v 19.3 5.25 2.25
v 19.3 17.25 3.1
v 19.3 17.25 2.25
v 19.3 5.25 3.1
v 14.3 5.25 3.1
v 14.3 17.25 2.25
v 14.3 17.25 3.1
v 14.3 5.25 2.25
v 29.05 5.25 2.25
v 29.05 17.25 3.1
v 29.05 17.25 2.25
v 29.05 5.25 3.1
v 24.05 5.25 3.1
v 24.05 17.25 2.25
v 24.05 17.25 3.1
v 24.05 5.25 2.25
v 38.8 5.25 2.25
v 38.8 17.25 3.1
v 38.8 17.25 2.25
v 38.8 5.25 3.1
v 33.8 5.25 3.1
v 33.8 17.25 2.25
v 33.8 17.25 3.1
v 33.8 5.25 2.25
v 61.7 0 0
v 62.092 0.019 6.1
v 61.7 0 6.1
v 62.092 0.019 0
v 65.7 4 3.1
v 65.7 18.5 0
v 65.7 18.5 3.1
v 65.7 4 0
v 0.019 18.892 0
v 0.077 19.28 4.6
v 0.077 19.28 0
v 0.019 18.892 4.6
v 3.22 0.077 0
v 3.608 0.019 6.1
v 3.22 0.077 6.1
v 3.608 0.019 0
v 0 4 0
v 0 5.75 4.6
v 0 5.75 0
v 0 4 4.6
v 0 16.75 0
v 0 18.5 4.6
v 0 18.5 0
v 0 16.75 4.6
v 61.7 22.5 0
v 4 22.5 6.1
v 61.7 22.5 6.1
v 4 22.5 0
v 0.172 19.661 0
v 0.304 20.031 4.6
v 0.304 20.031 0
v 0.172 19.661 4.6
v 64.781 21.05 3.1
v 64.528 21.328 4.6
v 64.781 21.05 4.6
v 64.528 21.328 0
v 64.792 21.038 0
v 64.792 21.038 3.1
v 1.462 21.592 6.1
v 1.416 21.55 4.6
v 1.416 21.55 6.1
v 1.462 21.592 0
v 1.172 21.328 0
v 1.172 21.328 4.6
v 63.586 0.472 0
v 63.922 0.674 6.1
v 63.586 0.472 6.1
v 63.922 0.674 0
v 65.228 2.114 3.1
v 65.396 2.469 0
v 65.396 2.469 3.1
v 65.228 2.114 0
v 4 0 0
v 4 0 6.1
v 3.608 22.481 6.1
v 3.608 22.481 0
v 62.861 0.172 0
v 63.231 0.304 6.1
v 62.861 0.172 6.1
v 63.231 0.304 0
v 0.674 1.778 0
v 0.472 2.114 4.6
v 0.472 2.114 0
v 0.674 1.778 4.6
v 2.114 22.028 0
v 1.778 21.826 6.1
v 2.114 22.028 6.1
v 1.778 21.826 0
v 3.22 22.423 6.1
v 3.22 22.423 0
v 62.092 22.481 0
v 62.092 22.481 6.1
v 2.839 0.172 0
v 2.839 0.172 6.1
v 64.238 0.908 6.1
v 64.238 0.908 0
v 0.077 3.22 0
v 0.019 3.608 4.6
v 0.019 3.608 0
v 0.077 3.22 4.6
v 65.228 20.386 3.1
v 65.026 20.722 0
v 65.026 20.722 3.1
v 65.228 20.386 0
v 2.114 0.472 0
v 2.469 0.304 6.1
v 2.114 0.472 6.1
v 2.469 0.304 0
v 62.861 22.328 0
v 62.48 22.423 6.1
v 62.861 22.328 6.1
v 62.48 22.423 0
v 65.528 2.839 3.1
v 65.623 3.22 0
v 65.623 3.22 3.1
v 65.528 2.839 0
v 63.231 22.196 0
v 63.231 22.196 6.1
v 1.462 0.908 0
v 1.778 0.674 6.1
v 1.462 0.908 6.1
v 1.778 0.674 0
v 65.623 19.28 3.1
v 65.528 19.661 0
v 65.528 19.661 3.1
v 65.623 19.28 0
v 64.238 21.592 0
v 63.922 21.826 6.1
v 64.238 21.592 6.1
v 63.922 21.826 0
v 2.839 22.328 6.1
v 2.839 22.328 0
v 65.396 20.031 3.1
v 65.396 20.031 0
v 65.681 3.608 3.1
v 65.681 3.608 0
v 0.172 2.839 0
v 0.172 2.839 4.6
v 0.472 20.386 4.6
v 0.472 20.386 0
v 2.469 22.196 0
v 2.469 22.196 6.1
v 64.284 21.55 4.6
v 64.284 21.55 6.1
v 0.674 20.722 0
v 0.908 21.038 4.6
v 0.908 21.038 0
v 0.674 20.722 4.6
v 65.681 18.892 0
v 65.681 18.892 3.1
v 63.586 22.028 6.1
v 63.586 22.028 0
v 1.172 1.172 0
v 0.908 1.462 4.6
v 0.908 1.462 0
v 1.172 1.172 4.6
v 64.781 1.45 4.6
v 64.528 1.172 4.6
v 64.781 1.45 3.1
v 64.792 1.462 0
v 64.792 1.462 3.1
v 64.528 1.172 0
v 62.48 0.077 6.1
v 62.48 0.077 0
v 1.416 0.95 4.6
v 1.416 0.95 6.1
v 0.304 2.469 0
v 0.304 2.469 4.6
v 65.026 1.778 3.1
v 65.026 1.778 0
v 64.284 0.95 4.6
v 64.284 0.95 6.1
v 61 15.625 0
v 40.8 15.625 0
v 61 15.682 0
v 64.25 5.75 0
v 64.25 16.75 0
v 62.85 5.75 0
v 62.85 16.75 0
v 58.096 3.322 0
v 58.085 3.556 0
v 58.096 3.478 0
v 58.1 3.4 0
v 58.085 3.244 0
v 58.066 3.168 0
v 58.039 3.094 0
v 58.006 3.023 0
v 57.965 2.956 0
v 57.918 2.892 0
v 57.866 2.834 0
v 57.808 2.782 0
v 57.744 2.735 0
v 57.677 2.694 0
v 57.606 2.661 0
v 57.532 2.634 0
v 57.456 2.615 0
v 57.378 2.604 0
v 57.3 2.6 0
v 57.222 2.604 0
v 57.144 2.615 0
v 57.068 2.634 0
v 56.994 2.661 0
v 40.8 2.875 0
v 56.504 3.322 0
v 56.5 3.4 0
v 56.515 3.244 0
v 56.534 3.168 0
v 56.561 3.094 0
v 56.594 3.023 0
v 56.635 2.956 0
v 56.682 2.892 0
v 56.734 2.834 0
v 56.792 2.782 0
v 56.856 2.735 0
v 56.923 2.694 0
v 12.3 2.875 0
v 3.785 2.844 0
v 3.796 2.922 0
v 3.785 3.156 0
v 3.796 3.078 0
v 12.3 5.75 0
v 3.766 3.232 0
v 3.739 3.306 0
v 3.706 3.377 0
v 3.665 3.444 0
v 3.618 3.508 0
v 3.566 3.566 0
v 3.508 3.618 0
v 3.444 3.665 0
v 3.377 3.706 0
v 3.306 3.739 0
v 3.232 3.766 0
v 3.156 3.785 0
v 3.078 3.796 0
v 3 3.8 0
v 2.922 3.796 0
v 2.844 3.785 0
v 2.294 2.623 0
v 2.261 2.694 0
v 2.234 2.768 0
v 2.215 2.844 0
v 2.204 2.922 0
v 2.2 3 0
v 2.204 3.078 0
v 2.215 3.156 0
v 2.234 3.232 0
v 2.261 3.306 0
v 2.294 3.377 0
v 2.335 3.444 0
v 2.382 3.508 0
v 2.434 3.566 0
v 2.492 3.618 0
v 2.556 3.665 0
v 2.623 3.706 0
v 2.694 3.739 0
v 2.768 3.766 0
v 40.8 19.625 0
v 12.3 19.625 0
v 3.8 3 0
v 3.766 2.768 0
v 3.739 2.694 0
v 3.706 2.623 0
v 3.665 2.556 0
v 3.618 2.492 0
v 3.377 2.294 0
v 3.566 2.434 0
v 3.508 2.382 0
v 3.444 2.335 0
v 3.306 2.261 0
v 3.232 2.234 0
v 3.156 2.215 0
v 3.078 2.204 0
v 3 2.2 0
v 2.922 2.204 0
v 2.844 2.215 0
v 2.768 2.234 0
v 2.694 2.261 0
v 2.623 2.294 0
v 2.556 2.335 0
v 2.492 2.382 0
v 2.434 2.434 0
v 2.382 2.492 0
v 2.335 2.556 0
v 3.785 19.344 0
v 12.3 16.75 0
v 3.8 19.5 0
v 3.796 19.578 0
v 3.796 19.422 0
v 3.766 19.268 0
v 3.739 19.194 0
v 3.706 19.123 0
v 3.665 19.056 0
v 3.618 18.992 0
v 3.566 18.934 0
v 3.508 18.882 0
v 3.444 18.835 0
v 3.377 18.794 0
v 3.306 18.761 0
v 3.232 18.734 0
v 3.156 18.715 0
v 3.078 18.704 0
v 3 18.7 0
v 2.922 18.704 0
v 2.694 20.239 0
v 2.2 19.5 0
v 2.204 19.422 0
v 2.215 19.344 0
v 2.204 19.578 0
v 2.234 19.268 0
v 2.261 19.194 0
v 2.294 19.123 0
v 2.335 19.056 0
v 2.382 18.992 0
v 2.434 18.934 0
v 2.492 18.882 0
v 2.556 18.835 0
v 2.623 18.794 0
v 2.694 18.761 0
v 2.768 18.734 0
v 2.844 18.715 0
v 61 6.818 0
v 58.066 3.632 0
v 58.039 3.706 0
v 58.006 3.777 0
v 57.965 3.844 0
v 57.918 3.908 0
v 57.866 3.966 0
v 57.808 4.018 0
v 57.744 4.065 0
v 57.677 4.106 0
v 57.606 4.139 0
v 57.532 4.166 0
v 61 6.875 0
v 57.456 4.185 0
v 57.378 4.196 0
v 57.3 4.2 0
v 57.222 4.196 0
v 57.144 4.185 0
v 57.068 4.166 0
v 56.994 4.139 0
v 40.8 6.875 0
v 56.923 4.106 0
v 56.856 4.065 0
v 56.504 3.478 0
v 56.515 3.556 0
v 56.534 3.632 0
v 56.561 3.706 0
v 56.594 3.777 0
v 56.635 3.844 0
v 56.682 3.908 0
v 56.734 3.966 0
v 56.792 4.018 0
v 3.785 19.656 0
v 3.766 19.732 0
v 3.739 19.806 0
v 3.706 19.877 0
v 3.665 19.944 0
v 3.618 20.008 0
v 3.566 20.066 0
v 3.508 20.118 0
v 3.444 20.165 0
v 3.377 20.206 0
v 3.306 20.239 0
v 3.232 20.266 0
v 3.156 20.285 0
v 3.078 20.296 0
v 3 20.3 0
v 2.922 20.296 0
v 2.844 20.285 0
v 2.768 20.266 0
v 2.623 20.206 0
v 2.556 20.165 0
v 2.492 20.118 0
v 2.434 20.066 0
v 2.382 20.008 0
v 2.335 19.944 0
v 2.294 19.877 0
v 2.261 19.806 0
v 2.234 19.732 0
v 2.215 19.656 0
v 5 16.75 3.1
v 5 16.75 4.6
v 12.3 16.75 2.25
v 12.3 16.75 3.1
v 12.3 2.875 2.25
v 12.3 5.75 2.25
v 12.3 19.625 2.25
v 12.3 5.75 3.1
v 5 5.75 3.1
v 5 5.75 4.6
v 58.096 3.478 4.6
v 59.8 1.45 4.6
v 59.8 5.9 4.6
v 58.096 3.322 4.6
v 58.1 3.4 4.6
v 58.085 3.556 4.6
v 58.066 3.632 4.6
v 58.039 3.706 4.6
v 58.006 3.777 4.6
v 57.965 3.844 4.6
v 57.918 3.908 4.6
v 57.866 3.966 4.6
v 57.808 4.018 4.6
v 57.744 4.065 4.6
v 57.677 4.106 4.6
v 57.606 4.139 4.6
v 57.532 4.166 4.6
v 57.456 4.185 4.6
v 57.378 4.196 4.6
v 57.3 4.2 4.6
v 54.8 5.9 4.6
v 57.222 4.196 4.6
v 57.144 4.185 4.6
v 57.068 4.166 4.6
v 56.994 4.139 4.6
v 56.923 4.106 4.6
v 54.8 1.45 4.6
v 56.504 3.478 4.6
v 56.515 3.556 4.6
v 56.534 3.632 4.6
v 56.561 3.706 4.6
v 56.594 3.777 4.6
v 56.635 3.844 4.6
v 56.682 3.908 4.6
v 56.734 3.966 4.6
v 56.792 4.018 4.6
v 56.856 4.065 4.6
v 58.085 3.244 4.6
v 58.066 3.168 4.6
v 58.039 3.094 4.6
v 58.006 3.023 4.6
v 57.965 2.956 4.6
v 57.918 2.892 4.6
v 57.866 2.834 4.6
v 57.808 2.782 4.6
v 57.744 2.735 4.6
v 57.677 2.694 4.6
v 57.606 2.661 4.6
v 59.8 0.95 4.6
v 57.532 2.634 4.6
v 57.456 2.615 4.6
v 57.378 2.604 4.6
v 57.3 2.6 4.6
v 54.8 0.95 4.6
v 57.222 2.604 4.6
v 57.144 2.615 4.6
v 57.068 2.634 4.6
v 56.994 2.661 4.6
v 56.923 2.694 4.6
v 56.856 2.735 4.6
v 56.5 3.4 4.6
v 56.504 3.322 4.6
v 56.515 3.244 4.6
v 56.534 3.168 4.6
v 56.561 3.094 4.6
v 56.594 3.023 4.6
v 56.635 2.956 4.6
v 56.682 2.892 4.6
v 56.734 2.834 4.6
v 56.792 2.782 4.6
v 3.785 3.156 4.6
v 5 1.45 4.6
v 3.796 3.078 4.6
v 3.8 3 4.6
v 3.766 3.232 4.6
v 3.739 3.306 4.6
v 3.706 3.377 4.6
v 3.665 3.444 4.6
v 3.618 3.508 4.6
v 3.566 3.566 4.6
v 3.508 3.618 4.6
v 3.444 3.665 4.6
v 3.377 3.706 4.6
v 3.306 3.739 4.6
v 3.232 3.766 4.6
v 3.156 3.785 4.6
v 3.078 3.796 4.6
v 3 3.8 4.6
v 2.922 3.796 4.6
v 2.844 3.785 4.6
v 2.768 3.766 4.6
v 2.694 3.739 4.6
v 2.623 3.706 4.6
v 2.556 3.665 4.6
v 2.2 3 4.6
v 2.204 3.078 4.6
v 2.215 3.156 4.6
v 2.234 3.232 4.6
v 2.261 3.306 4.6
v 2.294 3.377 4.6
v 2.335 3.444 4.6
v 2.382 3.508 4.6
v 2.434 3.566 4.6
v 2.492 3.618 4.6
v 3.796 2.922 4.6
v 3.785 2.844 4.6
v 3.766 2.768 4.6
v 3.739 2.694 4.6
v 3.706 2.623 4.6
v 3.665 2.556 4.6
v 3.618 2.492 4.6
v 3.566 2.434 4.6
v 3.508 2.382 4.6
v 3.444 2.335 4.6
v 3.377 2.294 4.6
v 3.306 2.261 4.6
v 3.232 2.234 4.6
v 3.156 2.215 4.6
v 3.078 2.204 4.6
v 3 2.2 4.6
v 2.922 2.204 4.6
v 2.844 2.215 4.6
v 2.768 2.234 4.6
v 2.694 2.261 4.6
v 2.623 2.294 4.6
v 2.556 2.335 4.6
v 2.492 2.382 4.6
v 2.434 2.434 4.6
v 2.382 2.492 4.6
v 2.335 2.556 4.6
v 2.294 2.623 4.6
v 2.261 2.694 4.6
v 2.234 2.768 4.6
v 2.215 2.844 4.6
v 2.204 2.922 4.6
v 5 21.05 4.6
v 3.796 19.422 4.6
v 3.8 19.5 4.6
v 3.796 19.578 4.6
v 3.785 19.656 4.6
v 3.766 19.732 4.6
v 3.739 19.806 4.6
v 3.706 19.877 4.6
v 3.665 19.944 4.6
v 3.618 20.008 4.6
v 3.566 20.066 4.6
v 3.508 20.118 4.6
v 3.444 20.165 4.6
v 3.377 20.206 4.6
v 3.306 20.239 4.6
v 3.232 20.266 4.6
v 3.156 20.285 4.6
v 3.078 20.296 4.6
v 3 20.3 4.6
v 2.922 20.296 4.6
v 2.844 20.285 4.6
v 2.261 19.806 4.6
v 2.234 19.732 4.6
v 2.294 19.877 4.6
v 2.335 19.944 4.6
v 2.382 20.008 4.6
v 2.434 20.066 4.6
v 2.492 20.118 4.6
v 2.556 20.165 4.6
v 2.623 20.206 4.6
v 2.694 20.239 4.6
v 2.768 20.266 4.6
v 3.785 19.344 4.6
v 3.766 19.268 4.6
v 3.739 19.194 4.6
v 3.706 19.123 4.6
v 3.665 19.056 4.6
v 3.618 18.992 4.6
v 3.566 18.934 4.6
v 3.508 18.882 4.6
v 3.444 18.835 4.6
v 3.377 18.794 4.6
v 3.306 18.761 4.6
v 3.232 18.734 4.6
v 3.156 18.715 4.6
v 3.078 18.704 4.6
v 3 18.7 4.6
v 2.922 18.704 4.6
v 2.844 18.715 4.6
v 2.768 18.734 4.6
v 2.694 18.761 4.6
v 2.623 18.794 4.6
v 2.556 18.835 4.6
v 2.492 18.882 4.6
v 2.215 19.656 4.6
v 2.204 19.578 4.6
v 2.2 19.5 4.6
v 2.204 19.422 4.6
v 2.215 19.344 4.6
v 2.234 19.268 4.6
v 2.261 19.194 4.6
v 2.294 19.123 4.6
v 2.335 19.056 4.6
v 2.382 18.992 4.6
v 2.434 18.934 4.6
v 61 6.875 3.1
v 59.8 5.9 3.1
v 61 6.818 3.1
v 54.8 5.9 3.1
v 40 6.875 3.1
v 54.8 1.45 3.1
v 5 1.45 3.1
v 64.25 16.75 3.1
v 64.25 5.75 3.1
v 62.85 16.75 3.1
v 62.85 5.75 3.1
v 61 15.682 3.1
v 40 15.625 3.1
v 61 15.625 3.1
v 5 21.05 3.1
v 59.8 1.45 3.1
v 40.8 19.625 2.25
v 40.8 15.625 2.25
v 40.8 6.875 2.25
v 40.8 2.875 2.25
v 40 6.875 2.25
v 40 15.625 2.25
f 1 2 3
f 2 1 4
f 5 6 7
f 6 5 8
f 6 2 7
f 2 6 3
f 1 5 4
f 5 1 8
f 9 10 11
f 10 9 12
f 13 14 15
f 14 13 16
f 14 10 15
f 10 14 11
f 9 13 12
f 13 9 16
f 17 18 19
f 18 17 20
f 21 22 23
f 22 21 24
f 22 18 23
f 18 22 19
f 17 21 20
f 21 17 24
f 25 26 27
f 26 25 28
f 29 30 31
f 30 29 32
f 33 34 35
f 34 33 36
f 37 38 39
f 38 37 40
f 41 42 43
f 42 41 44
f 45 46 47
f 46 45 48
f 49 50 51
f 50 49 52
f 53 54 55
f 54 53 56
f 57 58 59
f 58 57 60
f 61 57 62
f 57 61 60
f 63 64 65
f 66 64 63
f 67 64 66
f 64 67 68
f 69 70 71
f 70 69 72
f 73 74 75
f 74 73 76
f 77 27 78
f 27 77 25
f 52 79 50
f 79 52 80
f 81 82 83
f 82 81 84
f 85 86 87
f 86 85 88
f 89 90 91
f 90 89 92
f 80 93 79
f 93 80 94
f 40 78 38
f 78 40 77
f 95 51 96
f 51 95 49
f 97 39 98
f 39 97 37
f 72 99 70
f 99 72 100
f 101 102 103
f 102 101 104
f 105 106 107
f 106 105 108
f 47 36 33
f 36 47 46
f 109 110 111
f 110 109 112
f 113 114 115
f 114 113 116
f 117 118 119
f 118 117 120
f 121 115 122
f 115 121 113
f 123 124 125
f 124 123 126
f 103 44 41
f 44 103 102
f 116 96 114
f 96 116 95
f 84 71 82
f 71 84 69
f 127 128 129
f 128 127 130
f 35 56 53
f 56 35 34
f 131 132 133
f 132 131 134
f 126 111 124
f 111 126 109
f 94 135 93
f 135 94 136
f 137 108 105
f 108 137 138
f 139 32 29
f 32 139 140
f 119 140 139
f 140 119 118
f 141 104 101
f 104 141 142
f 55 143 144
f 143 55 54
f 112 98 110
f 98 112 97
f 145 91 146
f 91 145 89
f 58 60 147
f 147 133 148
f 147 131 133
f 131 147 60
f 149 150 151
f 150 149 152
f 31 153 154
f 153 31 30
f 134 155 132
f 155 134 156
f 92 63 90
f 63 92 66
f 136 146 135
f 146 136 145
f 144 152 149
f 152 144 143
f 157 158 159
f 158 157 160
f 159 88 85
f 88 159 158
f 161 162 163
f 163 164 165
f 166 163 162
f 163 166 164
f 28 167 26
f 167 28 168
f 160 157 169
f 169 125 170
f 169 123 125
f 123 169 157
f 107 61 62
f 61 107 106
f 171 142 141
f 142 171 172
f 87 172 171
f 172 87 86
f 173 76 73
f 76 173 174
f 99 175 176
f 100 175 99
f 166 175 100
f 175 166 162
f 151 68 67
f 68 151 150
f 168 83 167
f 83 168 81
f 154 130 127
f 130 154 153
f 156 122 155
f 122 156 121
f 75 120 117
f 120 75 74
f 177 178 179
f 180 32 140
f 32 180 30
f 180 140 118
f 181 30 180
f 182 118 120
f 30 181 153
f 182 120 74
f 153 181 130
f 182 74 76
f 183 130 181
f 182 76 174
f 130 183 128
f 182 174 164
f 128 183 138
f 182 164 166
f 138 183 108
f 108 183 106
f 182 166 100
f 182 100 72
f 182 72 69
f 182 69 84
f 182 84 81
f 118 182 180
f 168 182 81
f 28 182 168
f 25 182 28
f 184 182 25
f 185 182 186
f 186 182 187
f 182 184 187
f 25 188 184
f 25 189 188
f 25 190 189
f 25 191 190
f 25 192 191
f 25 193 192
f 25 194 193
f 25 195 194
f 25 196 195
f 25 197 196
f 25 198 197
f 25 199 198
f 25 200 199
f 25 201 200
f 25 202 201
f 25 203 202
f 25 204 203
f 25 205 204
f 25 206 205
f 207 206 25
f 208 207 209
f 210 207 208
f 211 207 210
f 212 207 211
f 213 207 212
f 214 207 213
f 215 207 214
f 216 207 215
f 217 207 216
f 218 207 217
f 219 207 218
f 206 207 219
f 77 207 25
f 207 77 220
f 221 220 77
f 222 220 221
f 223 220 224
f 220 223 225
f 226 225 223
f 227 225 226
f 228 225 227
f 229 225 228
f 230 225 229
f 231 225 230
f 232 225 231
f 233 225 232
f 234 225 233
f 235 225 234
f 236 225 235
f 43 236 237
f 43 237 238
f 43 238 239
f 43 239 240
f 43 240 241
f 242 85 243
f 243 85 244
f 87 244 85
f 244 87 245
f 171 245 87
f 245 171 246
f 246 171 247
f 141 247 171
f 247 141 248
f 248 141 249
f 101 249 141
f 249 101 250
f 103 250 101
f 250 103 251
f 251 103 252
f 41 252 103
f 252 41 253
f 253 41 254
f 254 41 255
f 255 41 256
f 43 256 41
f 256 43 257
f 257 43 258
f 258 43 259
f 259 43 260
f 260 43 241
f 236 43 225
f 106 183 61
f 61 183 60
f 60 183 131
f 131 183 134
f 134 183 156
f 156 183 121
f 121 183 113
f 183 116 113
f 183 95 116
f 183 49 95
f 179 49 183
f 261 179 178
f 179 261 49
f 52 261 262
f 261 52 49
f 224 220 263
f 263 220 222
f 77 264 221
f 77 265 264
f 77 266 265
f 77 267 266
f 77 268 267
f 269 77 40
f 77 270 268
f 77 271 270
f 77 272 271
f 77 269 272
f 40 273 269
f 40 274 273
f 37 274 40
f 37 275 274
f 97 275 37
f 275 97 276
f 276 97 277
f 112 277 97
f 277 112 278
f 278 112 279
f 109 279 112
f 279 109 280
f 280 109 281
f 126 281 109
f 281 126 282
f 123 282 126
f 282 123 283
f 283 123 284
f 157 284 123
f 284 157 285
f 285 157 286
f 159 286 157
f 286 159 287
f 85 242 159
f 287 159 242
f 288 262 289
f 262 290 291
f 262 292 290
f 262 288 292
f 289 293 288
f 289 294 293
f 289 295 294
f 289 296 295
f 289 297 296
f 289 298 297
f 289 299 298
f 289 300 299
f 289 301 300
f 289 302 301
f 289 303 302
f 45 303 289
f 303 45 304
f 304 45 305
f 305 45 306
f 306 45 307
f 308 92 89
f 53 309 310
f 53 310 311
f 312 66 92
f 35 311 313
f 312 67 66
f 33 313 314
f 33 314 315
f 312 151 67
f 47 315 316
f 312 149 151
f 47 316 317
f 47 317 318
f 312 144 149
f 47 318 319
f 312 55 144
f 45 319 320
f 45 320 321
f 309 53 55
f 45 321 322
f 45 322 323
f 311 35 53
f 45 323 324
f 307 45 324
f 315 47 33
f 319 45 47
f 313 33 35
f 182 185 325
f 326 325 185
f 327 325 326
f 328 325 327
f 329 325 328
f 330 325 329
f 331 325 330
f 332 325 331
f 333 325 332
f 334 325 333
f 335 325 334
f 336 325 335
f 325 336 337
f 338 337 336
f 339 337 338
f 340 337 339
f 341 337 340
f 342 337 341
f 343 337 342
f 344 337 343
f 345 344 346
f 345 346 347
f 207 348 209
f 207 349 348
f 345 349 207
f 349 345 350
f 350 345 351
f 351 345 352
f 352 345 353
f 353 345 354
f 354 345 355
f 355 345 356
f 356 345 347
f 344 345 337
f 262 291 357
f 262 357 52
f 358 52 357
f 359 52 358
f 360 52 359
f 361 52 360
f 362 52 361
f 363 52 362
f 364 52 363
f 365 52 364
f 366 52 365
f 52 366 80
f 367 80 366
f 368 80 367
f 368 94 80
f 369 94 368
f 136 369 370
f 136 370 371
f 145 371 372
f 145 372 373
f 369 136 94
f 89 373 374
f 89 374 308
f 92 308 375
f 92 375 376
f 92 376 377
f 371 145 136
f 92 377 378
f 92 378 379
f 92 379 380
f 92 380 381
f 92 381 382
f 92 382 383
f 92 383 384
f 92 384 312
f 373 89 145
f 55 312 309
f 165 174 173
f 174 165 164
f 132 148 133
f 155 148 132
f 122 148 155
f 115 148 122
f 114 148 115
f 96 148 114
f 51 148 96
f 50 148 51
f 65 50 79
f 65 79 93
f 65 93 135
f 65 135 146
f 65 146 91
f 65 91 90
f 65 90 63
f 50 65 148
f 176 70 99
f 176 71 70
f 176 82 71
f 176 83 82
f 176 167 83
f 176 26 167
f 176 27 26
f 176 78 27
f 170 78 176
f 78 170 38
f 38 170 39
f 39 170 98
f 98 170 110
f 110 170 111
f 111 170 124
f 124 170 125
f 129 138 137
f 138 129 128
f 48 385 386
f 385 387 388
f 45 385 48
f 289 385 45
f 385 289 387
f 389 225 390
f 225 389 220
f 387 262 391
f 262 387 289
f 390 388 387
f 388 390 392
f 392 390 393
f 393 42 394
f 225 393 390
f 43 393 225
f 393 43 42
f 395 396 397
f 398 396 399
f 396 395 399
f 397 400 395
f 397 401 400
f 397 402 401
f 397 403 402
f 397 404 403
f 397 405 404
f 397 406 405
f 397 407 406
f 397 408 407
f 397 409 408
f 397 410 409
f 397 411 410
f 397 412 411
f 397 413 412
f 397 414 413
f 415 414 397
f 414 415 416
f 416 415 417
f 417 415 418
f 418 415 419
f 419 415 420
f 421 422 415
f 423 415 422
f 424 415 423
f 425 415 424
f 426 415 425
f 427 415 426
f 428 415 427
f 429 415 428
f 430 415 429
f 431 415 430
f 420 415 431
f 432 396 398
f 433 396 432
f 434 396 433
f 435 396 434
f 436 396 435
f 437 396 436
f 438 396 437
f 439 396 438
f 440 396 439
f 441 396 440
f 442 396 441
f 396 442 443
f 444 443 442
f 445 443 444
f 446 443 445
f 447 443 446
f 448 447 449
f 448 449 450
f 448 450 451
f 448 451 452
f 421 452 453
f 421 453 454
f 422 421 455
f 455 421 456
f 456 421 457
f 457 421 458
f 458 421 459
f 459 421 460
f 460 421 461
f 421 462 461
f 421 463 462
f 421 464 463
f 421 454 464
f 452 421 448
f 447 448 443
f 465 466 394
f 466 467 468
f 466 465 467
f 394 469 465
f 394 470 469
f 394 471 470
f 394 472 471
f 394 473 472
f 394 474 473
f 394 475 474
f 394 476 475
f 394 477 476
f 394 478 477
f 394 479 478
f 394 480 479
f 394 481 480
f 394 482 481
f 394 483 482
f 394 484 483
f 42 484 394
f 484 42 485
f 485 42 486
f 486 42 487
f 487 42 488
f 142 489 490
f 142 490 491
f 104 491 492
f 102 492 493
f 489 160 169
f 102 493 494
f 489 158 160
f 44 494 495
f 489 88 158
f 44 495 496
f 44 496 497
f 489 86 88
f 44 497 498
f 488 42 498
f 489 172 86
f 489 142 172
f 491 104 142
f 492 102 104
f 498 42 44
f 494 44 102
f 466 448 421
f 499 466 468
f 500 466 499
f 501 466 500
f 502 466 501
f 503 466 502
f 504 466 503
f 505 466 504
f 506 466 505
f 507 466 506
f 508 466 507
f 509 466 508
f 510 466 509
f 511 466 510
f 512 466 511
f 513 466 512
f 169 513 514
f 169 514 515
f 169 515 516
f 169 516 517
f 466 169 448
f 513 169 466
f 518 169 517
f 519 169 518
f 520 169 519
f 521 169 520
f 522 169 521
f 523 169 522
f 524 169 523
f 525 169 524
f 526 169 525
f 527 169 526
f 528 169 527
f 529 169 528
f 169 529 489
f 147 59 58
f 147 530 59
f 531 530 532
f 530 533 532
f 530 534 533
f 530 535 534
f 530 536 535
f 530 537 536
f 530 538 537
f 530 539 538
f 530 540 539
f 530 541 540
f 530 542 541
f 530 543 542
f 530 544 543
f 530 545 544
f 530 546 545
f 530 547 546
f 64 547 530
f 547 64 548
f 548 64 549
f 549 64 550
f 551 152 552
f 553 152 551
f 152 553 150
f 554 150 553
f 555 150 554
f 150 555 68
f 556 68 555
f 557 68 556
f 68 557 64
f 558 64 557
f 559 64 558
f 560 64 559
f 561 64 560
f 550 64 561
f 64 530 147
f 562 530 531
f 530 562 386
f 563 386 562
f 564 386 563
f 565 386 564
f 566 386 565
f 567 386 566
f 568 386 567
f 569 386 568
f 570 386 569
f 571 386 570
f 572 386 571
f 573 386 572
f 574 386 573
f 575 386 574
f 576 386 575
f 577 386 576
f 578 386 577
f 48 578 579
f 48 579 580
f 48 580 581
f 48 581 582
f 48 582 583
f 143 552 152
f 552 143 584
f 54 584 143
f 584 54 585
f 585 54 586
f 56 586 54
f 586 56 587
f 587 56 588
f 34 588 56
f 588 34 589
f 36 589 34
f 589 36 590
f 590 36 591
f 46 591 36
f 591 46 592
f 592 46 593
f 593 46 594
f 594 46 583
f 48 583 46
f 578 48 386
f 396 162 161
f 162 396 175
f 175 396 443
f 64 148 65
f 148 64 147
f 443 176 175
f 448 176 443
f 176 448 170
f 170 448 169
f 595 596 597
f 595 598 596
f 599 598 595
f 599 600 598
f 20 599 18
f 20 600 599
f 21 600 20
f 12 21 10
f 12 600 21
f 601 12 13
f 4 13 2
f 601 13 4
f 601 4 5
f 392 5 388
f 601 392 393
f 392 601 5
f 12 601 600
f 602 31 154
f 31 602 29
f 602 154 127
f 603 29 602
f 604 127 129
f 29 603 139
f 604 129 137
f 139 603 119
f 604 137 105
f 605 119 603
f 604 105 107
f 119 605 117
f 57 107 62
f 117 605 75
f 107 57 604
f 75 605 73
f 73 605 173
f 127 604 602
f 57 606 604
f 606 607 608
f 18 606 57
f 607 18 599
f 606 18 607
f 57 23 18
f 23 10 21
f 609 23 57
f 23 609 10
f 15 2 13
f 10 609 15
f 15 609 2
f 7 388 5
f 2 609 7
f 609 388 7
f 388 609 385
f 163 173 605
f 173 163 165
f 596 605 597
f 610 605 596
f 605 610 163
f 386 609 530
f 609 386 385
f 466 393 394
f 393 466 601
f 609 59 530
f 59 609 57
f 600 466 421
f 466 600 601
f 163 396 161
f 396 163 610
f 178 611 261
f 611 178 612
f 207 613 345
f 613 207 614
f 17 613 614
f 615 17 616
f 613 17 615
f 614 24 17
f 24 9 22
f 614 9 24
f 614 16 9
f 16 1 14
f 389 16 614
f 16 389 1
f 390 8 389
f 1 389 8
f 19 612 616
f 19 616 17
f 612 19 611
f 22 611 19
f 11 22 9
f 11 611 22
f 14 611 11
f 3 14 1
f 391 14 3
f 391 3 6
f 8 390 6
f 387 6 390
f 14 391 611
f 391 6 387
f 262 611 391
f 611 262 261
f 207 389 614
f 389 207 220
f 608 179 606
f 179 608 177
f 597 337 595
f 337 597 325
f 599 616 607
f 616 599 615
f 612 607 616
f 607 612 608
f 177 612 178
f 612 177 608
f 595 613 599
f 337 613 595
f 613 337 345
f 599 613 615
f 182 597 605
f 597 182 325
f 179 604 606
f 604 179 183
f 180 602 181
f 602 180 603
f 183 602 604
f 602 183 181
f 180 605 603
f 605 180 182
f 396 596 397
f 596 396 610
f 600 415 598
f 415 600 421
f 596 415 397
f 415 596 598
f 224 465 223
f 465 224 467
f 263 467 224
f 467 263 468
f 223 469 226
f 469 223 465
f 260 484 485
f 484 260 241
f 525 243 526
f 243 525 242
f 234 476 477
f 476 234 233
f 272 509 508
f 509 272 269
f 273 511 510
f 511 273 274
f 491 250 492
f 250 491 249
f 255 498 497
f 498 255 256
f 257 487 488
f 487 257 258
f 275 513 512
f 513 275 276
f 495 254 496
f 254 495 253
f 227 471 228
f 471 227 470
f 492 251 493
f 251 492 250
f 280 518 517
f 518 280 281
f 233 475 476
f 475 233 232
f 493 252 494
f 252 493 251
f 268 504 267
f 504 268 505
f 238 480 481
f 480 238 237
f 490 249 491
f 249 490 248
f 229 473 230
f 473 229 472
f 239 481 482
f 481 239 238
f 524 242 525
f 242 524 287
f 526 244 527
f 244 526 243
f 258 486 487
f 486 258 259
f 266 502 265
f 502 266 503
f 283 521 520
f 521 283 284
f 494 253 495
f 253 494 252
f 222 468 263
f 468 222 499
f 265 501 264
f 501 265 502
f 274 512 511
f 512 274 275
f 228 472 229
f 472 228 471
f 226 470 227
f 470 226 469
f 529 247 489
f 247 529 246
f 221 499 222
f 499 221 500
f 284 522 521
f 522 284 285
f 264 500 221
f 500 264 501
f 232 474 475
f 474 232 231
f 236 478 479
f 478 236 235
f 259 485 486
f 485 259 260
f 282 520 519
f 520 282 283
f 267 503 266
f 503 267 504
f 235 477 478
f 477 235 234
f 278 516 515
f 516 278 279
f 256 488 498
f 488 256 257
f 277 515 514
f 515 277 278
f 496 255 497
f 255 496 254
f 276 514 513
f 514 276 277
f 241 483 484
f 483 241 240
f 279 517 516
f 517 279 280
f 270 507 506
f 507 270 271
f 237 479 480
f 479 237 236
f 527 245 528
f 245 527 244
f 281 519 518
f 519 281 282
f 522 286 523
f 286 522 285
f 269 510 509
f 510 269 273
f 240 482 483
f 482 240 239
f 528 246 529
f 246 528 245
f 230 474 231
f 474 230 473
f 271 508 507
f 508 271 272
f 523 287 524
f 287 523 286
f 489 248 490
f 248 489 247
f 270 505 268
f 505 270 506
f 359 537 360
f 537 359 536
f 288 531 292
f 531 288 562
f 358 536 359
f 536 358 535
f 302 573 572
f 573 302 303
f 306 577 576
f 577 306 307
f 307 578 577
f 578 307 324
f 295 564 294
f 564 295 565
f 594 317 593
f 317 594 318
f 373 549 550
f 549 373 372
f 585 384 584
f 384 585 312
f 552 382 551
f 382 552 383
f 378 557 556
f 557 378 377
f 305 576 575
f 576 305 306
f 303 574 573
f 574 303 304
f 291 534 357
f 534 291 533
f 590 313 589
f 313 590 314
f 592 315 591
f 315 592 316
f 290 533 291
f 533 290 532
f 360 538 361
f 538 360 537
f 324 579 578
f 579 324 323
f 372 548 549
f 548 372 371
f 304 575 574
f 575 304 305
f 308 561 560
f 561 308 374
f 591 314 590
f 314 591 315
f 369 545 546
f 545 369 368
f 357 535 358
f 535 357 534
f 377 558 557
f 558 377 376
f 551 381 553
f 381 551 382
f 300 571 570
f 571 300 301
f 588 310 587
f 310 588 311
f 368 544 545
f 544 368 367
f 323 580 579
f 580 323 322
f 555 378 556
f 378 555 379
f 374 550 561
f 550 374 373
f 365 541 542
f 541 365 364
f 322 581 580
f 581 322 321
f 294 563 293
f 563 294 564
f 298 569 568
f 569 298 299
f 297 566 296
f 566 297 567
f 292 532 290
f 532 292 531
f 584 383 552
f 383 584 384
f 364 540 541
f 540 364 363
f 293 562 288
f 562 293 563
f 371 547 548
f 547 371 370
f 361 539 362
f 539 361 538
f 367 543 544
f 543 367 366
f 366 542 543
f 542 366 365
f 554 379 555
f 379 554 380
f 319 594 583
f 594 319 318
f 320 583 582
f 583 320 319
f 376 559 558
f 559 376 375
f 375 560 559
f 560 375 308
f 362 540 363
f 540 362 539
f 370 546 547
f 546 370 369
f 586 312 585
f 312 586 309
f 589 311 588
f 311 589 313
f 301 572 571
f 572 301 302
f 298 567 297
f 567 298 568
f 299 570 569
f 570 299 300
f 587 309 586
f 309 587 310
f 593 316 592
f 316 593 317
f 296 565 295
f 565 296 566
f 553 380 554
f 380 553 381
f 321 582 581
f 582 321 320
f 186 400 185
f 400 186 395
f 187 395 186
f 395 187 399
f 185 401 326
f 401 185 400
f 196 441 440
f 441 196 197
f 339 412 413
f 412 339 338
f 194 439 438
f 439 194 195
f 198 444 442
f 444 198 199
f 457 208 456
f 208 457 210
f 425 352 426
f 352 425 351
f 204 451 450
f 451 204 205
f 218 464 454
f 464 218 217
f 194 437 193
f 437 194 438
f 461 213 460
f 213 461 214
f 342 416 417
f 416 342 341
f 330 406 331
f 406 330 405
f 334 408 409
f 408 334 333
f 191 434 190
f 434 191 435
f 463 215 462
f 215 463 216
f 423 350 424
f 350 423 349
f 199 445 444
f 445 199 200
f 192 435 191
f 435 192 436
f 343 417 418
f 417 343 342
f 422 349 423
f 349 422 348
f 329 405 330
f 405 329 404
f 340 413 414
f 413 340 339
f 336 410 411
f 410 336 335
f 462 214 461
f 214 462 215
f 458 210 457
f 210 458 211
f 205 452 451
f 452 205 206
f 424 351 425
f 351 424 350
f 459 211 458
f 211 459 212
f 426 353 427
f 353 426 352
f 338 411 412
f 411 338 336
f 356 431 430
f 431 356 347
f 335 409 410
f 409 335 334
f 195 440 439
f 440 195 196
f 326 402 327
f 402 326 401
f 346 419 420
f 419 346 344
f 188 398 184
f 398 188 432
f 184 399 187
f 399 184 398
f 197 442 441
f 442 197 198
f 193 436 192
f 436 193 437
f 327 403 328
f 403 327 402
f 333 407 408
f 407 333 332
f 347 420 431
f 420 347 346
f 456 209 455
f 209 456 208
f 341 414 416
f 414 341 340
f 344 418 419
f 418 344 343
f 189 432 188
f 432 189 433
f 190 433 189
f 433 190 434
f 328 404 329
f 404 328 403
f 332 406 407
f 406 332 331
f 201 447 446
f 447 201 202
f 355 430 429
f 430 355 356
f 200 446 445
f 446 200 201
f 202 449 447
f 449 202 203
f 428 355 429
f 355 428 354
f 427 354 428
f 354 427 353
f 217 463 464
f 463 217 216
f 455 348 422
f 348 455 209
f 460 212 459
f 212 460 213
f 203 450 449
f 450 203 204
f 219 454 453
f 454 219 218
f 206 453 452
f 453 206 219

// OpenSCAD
// file: lib/Triangles.scad
/*
Triangles.scad
 Author: Tim Koopman
 https://github.com/tkoopman/Delta-Diamond/blob/master/OpenSCAD/Triangles.scad

         angleCA
           /|\
        a / H \ c
         /  |  \
 angleAB ------- angleBC
            b

Standard Parameters
	center: true/false
		If true same as centerXYZ = [true, true, true]

	centerXYZ: Vector of 3 true/false values [CenterX, CenterY, CenterZ]
		center must be left undef

	height: The 3D height of the Triangle. Ignored if heights defined

	heights: Vector of 3 height values heights @ [angleAB, angleBC, angleCA]
		If CenterZ is true each height will be centered individually, this means
		the shape will be different depending on CenterZ. Most times you will want
		CenterZ to be true to get the shape most people want.
*/

/* 
Triangle
	a: Length of side a
	b: Length of side b
	angle: angle at point angleAB
*/
module Triangle(
			a, b, angle, height=1, heights=undef,
			center=undef, centerXYZ=[false,false,false])
{
	// Calculate Heights at each point
	heightAB = ((heights==undef) ? height : heights[0])/2;
	heightBC = ((heights==undef) ? height : heights[1])/2;
	heightCA = ((heights==undef) ? height : heights[2])/2;
	centerZ = (center || (center==undef && centerXYZ[2]))?0:max(heightAB,heightBC,heightCA);

	// Calculate Offsets for centering
	offsetX = (center || (center==undef && centerXYZ[0]))?((cos(angle)*a)+b)/3:0;
	offsetY = (center || (center==undef && centerXYZ[1]))?(sin(angle)*a)/3:0;
	
	pointAB1 = [-offsetX,-offsetY, centerZ-heightAB];
	pointAB2 = [-offsetX,-offsetY, centerZ+heightAB];
	pointBC1 = [b-offsetX,-offsetY, centerZ-heightBC];
	pointBC2 = [b-offsetX,-offsetY, centerZ+heightBC];
	pointCA1 = [(cos(angle)*a)-offsetX,(sin(angle)*a)-offsetY, centerZ-heightCA];
	pointCA2 = [(cos(angle)*a)-offsetX,(sin(angle)*a)-offsetY, centerZ+heightCA];

	polyhedron(
		points=[	pointAB1, pointBC1, pointCA1,
					pointAB2, pointBC2, pointCA2 ],
		triangles=[	
			[0, 1, 2],
			[3, 5, 4],
			[0, 3, 1],
			[1, 3, 4],
			[1, 4, 2],
			[2, 4, 5],
			[2, 5, 0],
			[0, 5, 3] ] );
}

/*
Isosceles Triangle
	Exactly 2 of the following paramaters must be defined.
	If all 3 defined H will be ignored.
	b: length of side b
	angle: angle at points angleAB & angleBC.
*/
module Isosceles_Triangle(
			b, angle, H=undef, height=1, heights=undef,
			center=undef, centerXYZ=[true, false, false])
{
	valid = 	(angle!=undef)?((angle < 90) && (b!=undef||H!=undef)) : (b!=undef&&H!=undef);
	ANGLE = (angle!=undef) ? angle : atan(H / (b/2));
	a = (b==undef)?(H/sin((180-(angle*2))/2)) : 
		 (b / cos(ANGLE))/2;
	B = (b==undef)? (cos(angle)*a)*2:b;
	if (valid)
	{
		Triangle(a=a, b=B, angle=ANGLE, height=height, heights=heights,
					center=center, centerXYZ=centerXYZ);
	} else {
		echo("Invalid Isosceles_Triangle. Must specify any 2 of b, angle and H, and if angle used angle must be less than 90");
	}
}

/*
Right Angled Triangle
	Create a Right Angled Triangle where the hypotenuse will be calculated.

       |\
      a| \
       |  \
       ----
         b
	a: length of side a
	b: length of side b
*/
module Right_Angled_Triangle(
			a, b, height=1, heights=undef,
			center=undef, centerXYZ=[false, false, false])
{
	Triangle(a=a, b=b, angle=90, height=height, heights=heights,
				center=center, centerXYZ=centerXYZ);
}

/*
Wedge
	Is same as Right Angled Triangle with 2 different heights, and rotated.
	Good for creating support structures.
*/
module Wedge(a, b, w1, w2)
{
	rotate([90,0,0])
		Right_Angled_Triangle(a, b, heights=[w1, w2, w1], centerXYZ=[false, false, true]);
}

/*
Equilateral Triangle
	Create a Equilateral Triangle.

	l: Length of all sides (a, b & c)
	H: Triangle size will be based on the this 2D height
		When using H, l is ignored.
*/
module Equilateral_Triangle(
			l=10, H=undef, height=1, heights=undef,
			center=undef, centerXYZ=[true,false,false])
{
	L = (H==undef)?l:H/sin(60);
	Triangle(a=L,b=L,angle=60,height=height, heights=heights,
				center=center, centerXYZ=centerXYZ);
}

/*
Trapezoid
	Create a Basic Trapezoid (Based on Isosceles_Triangle)

            d
          /----\
         /  |   \
     a  /   H    \ c
       /    |     \
 angle ------------ angle
            b

	b: Length of side b
	angle: Angle at points angleAB & angleBC
	H: The 2D height at which the triangle should be cut to create the trapezoid
	heights: If vector of size 3 (Standard for triangles) both cd & da will be the same height, if vector have 4 values [ab,bc,cd,da] than each point can have different heights.
*/
module Trapezoid(
			b, angle=60, H, height=1, heights=undef,
			center=undef, centerXYZ=[true,false,false])
{
	validAngle = (angle < 90);
	adX = H / tan(angle);

	// Calculate Heights at each point
	heightAB = ((heights==undef) ? height : heights[0])/2;
	heightBC = ((heights==undef) ? height : heights[1])/2;
	heightCD = ((heights==undef) ? height : heights[2])/2;
	heightDA = ((heights==undef) ? height : ((len(heights) > 3)?heights[3]:heights[2]))/2;

	// Centers
	centerX = (center || (center==undef && centerXYZ[0]))?0:b/2;
	centerY = (center || (center==undef && centerXYZ[1]))?0:H/2;
	centerZ = (center || (center==undef && centerXYZ[2]))?0:max(heightAB,heightBC,heightCD,heightDA);

	// Points
	y = H/2;
	bx = b/2;
	dx = (b-(adX*2))/2;

	pointAB1 = [centerX-bx, centerY-y, centerZ-heightAB];
	pointAB2 = [centerX-bx, centerY-y, centerZ+heightAB];
	pointBC1 = [centerX+bx, centerY-y, centerZ-heightBC];
	pointBC2 = [centerX+bx, centerY-y, centerZ+heightBC];
	pointCD1 = [centerX+dx, centerY+y, centerZ-heightCD];
	pointCD2 = [centerX+dx, centerY+y, centerZ+heightCD];
	pointDA1 = [centerX-dx, centerY+y, centerZ-heightDA];
	pointDA2 = [centerX-dx, centerY+y, centerZ+heightDA];

	validH = (adX < b/2);

	if (validAngle && validH)
	{
		polyhedron(
			points=[	pointAB1, pointBC1, pointCD1, pointDA1,
						pointAB2, pointBC2, pointCD2, pointDA2 ],
			triangles=[	
				[0, 1, 2],
				[0, 2, 3],
				[4, 6, 5],
				[4, 7, 6],
				[0, 4, 1],
				[1, 4, 5],
				[1, 5, 2],
				[2, 5, 6],
				[2, 6, 3],
				[3, 6, 7],
				[3, 7, 0],
				[0, 7, 4]	] );
	} else {
		if (!validAngle) echo("Trapezoid invalid, angle must be less than 90");
		else echo("Trapezoid invalid, H is larger than triangle");
	}
}


// Examples
//Triangle(a=5, b=15, angle=33, centerXYZ=[true,false,false]);
//translate([20,0,0]) Right_Angled_Triangle(a=5, b=20, centerXYZ=[false,true,false]);
//translate([45,0,0]) Wedge(a=5, b=20, w1=10, w2=5);
//translate([-20,0,0]) Trapezoid(b=20, angle=33, H=4, height=5, centerXYZ=[true,false,true]);
//
//translate([0,10,0]) Isosceles_Triangle(b=20, angle=33);
//translate([30,10,0]) Isosceles_Triangle(b=20, H=5);
//translate([-30,10,0]) Isosceles_Triangle(angle=33, H=5, center=true);
//
//translate([15,-25,0]) Equilateral_Triangle(l=20);
//translate([-15,-25,0]) Equilateral_Triangle(H=20);
// main file
$fn = 64;

include <lib/Triangles.scad>;

holder_dims = [65.7, 22.5, 6.1];
holder_rounding = 4;

top_cutout = [12.3, 11];

board_cutout = [65.7, 20.6, 1.5];

board_second_cutout = [65.7, 19.6, 1.5];

screen_cutout = [28.5, 16.75, 2.25];

screen_bridge_cutout = [5, 12, 5];

screen_inset = 2;

screen_bridge_offset = ((screen_cutout[0] - (screen_bridge_cutout[0] * 3)) / 2) - screen_inset;

button_cutout = [21, 8.75, 5];

usb_cutout = [1.85, 0, 5];

usb_second_cutout = [1.4, 11, 5];

screw_diameter = 1.6;

difference() {
union() {
    difference() {
        translate([holder_rounding, holder_rounding, 0]) linear_extrude(holder_dims[2]) offset(holder_rounding) square([holder_dims[0] - holder_rounding * 2, holder_dims[1] - holder_rounding * 2]);

        translate([0, (holder_dims[1] - top_cutout[1]) / 2, 0]) linear_extrude(holder_dims[2]) square(top_cutout);

        translate([0, (holder_dims[1] - board_cutout[1]) / 2, holder_dims[2] - board_cutout[2]]) cube(board_cutout);

        translate([5, (holder_dims[1] - board_second_cutout[1]) / 2, holder_dims[2] - board_cutout[2] - board_second_cutout[2]]) cube(board_second_cutout);

        translate([12.3, (holder_dims[1] - screen_cutout[1]) / 2, 0]) cube(screen_cutout);

        translate([40, (holder_dims[1] - button_cutout[1]) / 2, 0]) cube(button_cutout);

        translate([40 + button_cutout[0] + usb_cutout[0], (holder_dims[1] - usb_cutout[1]) / 2, 0]) rotate([0, 0, 90]) Trapezoid(b = 11, H = 1.85, height = 5, angle = 60);

        translate([40 + button_cutout[0] + usb_cutout[0], (holder_dims[1] - usb_second_cutout[1]) / 2, 0]) cube(usb_second_cutout);

        for (i = [0 : 2]) {
            translate([12.3 + screen_inset + ((screen_bridge_offset + screen_bridge_cutout[0]) * i), (holder_dims[1] - screen_bridge_cutout[1]) / 2, 0]) cube(screen_bridge_cutout);
        }
    }

    translate([57.3, 3.4, holder_dims[2] - board_cutout[2] - .75]) cube([5, 5, 1.5], center = true);
}
translate([3, 3, 0]) cylinder(d = screw_diameter, h = holder_dims[2]);

translate([3, holder_dims[1] - 3, 0]) cylinder(d = screw_diameter, h = holder_dims[2]);

translate([57.3, 3.4, 0]) cylinder(d = screw_diameter, h = holder_dims[2]);
}
